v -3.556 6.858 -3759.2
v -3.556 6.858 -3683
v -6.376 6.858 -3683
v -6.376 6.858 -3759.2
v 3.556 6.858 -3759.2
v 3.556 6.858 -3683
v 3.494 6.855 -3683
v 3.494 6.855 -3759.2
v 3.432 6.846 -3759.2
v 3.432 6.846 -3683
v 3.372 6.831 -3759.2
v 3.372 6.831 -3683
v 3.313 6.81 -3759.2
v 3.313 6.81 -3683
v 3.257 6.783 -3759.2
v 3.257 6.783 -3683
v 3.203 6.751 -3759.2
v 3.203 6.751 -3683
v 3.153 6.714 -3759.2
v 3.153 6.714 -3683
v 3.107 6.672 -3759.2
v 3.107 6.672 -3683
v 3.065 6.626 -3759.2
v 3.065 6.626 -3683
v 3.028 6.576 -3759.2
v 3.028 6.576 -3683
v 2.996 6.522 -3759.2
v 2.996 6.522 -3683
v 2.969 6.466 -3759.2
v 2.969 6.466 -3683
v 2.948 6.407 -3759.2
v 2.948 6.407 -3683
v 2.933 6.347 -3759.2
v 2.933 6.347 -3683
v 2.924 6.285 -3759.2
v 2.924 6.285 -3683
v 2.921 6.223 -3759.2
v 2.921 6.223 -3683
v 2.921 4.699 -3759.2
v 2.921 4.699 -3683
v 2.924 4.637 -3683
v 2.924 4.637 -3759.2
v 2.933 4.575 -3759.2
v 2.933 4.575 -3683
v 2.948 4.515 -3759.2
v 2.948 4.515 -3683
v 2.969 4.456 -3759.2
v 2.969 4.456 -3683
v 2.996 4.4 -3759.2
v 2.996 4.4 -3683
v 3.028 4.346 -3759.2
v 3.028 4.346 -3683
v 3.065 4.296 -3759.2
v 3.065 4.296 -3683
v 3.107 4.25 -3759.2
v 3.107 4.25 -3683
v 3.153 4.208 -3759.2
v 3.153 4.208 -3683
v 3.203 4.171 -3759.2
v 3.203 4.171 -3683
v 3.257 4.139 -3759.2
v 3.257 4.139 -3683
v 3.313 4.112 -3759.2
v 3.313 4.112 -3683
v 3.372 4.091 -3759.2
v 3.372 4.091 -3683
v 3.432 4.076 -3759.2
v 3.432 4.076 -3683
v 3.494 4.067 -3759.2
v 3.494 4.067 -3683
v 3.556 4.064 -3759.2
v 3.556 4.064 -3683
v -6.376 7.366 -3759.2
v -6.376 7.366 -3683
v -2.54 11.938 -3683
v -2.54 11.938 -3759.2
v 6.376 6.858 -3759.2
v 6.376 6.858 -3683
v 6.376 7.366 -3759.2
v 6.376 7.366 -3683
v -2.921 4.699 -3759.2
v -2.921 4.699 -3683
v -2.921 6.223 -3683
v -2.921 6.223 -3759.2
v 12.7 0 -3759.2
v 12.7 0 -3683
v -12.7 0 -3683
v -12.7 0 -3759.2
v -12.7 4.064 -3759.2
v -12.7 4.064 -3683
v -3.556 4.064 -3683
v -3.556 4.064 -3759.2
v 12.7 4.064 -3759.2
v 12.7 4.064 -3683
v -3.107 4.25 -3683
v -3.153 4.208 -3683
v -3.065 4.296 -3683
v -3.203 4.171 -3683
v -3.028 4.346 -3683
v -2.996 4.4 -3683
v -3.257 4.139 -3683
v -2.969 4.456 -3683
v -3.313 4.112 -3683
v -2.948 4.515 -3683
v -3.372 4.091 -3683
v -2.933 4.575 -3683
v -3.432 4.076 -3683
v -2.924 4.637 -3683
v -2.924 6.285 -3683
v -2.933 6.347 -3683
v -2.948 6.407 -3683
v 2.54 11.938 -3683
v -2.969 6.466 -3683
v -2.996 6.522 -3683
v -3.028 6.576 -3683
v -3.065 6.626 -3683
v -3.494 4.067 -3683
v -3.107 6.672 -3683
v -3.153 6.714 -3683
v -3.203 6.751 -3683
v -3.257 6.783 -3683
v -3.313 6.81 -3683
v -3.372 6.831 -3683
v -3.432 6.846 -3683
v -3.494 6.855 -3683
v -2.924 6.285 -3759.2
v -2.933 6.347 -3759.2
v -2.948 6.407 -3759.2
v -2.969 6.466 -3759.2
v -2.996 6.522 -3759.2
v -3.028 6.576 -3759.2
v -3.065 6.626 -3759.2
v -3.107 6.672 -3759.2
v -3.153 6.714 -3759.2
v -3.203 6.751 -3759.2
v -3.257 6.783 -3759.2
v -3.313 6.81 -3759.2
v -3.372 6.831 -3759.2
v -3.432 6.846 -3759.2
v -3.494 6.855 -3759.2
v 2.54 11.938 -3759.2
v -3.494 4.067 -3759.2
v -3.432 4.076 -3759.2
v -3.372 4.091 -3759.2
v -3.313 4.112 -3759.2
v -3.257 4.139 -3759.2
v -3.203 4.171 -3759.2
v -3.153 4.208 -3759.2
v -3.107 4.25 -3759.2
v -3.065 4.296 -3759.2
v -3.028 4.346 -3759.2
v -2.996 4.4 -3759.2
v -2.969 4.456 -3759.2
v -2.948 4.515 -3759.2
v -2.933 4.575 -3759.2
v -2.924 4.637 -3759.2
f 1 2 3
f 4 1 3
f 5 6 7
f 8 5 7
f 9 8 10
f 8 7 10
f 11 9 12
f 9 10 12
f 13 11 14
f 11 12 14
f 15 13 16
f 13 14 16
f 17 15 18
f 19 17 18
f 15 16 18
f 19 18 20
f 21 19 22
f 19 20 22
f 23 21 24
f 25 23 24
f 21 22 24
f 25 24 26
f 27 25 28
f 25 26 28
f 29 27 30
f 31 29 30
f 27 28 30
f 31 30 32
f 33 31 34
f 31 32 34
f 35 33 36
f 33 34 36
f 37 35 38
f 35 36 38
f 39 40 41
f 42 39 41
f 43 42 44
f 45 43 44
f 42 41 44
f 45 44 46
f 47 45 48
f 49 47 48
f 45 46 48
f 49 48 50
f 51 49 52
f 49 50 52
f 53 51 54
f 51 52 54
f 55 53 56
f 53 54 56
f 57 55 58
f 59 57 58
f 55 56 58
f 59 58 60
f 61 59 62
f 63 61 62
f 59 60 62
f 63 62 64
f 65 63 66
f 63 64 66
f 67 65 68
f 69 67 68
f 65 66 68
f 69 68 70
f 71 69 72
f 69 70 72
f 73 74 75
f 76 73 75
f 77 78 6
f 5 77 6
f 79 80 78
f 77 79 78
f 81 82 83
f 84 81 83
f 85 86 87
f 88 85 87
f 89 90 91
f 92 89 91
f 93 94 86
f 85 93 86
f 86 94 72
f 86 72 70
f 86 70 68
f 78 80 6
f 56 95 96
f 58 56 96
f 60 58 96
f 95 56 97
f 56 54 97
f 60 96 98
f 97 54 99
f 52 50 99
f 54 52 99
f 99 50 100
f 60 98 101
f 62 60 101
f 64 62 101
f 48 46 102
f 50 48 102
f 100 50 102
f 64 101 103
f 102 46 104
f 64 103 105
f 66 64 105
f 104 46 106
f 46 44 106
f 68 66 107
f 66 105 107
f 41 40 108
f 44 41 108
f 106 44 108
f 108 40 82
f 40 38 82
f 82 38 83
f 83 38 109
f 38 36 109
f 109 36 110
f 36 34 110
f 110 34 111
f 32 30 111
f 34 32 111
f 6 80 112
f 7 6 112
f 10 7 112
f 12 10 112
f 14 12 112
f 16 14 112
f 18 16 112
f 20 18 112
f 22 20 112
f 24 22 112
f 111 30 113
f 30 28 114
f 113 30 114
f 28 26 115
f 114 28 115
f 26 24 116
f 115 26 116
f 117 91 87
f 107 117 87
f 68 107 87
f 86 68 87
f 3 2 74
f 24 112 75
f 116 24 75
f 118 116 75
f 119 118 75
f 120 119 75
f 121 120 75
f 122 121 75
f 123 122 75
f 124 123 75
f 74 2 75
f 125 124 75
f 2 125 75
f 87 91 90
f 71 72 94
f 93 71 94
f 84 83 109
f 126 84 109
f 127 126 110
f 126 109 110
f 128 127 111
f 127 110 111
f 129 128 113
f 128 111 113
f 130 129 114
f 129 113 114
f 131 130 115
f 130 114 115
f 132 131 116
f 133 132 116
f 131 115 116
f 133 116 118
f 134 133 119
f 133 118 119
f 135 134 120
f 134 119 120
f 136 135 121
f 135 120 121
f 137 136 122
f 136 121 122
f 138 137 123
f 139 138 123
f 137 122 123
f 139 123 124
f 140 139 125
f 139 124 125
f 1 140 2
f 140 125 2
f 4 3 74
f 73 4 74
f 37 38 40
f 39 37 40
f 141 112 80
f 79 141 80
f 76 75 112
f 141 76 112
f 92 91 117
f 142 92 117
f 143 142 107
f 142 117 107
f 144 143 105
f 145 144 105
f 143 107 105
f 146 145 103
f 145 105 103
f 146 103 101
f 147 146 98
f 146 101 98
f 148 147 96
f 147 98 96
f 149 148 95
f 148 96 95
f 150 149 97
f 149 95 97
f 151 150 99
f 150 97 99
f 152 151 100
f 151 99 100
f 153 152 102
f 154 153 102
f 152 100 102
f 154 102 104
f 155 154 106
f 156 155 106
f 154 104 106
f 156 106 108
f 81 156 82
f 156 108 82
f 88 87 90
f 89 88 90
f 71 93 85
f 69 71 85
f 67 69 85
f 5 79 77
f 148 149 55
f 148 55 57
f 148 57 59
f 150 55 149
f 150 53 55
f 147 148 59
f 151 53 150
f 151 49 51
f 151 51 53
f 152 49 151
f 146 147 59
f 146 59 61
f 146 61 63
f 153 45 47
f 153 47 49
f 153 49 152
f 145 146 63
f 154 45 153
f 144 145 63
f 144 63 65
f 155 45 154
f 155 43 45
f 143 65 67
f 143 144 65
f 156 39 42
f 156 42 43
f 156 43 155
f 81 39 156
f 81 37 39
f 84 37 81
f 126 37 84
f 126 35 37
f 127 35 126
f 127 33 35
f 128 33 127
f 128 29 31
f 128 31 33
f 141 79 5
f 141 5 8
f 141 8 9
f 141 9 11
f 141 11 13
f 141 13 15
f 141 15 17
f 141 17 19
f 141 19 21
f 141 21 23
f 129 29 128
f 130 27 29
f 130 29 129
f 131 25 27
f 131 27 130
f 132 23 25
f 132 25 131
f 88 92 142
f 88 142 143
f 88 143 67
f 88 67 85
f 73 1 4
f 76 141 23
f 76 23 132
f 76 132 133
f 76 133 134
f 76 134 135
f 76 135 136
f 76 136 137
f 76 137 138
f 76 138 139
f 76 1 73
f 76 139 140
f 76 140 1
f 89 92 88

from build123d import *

# Parameters (mm, degrees)
BOSS_EXTRUDE6_DEPTH = 76.2


with BuildPart() as part:
    # Sketch1 → Boss-Extrude6 (new body)
    with BuildSketch(Plane(origin=(0, 0, -3683), x_dir=(-1, 0, 0), z_dir=(0, 0, -1))):
        with BuildLine():
            Line((12.7, 4.064), (3.556, 4.064))
            ThreePointArc((3.556, 4.064), (3.106987194, 4.249987194), (2.921, 4.699))
            Line((2.921, 4.699), (2.921, 6.223))
            ThreePointArc((2.921, 6.223), (3.106987194, 6.672012806), (3.556, 6.858))
            Line((3.556, 6.858), (6.376363549, 6.858))
            Line((6.376363549, 6.858), (6.376363549, 7.365999958))
            Line((6.376363549, 7.365999958), (2.54, 11.938))
            Line((2.54, 11.938), (-2.54, 11.938))
            Line((-2.54, 11.938), (-6.376363549, 7.365999958))
            Line((-6.376363549, 7.365999958), (-6.376363549, 6.858))
            Line((-6.376363549, 6.858), (-3.556, 6.858))
            ThreePointArc((-3.556, 6.858), (-3.106987194, 6.672012806), (-2.921, 6.223))
            Line((-2.921, 6.223), (-2.921, 4.699))
            ThreePointArc((-2.921, 4.699), (-3.106987194, 4.249987194), (-3.556, 4.064))
            Line((-3.556, 4.064), (-12.7, 4.064))
            Line((-12.7, 4.064), (-12.7, 0))
            Line((-12.7, 0), (12.7, 0))
            Line((12.7, 0), (12.7, 4.064))
        make_face()
    extrude(amount=BOSS_EXTRUDE6_DEPTH)


solid = part.part
